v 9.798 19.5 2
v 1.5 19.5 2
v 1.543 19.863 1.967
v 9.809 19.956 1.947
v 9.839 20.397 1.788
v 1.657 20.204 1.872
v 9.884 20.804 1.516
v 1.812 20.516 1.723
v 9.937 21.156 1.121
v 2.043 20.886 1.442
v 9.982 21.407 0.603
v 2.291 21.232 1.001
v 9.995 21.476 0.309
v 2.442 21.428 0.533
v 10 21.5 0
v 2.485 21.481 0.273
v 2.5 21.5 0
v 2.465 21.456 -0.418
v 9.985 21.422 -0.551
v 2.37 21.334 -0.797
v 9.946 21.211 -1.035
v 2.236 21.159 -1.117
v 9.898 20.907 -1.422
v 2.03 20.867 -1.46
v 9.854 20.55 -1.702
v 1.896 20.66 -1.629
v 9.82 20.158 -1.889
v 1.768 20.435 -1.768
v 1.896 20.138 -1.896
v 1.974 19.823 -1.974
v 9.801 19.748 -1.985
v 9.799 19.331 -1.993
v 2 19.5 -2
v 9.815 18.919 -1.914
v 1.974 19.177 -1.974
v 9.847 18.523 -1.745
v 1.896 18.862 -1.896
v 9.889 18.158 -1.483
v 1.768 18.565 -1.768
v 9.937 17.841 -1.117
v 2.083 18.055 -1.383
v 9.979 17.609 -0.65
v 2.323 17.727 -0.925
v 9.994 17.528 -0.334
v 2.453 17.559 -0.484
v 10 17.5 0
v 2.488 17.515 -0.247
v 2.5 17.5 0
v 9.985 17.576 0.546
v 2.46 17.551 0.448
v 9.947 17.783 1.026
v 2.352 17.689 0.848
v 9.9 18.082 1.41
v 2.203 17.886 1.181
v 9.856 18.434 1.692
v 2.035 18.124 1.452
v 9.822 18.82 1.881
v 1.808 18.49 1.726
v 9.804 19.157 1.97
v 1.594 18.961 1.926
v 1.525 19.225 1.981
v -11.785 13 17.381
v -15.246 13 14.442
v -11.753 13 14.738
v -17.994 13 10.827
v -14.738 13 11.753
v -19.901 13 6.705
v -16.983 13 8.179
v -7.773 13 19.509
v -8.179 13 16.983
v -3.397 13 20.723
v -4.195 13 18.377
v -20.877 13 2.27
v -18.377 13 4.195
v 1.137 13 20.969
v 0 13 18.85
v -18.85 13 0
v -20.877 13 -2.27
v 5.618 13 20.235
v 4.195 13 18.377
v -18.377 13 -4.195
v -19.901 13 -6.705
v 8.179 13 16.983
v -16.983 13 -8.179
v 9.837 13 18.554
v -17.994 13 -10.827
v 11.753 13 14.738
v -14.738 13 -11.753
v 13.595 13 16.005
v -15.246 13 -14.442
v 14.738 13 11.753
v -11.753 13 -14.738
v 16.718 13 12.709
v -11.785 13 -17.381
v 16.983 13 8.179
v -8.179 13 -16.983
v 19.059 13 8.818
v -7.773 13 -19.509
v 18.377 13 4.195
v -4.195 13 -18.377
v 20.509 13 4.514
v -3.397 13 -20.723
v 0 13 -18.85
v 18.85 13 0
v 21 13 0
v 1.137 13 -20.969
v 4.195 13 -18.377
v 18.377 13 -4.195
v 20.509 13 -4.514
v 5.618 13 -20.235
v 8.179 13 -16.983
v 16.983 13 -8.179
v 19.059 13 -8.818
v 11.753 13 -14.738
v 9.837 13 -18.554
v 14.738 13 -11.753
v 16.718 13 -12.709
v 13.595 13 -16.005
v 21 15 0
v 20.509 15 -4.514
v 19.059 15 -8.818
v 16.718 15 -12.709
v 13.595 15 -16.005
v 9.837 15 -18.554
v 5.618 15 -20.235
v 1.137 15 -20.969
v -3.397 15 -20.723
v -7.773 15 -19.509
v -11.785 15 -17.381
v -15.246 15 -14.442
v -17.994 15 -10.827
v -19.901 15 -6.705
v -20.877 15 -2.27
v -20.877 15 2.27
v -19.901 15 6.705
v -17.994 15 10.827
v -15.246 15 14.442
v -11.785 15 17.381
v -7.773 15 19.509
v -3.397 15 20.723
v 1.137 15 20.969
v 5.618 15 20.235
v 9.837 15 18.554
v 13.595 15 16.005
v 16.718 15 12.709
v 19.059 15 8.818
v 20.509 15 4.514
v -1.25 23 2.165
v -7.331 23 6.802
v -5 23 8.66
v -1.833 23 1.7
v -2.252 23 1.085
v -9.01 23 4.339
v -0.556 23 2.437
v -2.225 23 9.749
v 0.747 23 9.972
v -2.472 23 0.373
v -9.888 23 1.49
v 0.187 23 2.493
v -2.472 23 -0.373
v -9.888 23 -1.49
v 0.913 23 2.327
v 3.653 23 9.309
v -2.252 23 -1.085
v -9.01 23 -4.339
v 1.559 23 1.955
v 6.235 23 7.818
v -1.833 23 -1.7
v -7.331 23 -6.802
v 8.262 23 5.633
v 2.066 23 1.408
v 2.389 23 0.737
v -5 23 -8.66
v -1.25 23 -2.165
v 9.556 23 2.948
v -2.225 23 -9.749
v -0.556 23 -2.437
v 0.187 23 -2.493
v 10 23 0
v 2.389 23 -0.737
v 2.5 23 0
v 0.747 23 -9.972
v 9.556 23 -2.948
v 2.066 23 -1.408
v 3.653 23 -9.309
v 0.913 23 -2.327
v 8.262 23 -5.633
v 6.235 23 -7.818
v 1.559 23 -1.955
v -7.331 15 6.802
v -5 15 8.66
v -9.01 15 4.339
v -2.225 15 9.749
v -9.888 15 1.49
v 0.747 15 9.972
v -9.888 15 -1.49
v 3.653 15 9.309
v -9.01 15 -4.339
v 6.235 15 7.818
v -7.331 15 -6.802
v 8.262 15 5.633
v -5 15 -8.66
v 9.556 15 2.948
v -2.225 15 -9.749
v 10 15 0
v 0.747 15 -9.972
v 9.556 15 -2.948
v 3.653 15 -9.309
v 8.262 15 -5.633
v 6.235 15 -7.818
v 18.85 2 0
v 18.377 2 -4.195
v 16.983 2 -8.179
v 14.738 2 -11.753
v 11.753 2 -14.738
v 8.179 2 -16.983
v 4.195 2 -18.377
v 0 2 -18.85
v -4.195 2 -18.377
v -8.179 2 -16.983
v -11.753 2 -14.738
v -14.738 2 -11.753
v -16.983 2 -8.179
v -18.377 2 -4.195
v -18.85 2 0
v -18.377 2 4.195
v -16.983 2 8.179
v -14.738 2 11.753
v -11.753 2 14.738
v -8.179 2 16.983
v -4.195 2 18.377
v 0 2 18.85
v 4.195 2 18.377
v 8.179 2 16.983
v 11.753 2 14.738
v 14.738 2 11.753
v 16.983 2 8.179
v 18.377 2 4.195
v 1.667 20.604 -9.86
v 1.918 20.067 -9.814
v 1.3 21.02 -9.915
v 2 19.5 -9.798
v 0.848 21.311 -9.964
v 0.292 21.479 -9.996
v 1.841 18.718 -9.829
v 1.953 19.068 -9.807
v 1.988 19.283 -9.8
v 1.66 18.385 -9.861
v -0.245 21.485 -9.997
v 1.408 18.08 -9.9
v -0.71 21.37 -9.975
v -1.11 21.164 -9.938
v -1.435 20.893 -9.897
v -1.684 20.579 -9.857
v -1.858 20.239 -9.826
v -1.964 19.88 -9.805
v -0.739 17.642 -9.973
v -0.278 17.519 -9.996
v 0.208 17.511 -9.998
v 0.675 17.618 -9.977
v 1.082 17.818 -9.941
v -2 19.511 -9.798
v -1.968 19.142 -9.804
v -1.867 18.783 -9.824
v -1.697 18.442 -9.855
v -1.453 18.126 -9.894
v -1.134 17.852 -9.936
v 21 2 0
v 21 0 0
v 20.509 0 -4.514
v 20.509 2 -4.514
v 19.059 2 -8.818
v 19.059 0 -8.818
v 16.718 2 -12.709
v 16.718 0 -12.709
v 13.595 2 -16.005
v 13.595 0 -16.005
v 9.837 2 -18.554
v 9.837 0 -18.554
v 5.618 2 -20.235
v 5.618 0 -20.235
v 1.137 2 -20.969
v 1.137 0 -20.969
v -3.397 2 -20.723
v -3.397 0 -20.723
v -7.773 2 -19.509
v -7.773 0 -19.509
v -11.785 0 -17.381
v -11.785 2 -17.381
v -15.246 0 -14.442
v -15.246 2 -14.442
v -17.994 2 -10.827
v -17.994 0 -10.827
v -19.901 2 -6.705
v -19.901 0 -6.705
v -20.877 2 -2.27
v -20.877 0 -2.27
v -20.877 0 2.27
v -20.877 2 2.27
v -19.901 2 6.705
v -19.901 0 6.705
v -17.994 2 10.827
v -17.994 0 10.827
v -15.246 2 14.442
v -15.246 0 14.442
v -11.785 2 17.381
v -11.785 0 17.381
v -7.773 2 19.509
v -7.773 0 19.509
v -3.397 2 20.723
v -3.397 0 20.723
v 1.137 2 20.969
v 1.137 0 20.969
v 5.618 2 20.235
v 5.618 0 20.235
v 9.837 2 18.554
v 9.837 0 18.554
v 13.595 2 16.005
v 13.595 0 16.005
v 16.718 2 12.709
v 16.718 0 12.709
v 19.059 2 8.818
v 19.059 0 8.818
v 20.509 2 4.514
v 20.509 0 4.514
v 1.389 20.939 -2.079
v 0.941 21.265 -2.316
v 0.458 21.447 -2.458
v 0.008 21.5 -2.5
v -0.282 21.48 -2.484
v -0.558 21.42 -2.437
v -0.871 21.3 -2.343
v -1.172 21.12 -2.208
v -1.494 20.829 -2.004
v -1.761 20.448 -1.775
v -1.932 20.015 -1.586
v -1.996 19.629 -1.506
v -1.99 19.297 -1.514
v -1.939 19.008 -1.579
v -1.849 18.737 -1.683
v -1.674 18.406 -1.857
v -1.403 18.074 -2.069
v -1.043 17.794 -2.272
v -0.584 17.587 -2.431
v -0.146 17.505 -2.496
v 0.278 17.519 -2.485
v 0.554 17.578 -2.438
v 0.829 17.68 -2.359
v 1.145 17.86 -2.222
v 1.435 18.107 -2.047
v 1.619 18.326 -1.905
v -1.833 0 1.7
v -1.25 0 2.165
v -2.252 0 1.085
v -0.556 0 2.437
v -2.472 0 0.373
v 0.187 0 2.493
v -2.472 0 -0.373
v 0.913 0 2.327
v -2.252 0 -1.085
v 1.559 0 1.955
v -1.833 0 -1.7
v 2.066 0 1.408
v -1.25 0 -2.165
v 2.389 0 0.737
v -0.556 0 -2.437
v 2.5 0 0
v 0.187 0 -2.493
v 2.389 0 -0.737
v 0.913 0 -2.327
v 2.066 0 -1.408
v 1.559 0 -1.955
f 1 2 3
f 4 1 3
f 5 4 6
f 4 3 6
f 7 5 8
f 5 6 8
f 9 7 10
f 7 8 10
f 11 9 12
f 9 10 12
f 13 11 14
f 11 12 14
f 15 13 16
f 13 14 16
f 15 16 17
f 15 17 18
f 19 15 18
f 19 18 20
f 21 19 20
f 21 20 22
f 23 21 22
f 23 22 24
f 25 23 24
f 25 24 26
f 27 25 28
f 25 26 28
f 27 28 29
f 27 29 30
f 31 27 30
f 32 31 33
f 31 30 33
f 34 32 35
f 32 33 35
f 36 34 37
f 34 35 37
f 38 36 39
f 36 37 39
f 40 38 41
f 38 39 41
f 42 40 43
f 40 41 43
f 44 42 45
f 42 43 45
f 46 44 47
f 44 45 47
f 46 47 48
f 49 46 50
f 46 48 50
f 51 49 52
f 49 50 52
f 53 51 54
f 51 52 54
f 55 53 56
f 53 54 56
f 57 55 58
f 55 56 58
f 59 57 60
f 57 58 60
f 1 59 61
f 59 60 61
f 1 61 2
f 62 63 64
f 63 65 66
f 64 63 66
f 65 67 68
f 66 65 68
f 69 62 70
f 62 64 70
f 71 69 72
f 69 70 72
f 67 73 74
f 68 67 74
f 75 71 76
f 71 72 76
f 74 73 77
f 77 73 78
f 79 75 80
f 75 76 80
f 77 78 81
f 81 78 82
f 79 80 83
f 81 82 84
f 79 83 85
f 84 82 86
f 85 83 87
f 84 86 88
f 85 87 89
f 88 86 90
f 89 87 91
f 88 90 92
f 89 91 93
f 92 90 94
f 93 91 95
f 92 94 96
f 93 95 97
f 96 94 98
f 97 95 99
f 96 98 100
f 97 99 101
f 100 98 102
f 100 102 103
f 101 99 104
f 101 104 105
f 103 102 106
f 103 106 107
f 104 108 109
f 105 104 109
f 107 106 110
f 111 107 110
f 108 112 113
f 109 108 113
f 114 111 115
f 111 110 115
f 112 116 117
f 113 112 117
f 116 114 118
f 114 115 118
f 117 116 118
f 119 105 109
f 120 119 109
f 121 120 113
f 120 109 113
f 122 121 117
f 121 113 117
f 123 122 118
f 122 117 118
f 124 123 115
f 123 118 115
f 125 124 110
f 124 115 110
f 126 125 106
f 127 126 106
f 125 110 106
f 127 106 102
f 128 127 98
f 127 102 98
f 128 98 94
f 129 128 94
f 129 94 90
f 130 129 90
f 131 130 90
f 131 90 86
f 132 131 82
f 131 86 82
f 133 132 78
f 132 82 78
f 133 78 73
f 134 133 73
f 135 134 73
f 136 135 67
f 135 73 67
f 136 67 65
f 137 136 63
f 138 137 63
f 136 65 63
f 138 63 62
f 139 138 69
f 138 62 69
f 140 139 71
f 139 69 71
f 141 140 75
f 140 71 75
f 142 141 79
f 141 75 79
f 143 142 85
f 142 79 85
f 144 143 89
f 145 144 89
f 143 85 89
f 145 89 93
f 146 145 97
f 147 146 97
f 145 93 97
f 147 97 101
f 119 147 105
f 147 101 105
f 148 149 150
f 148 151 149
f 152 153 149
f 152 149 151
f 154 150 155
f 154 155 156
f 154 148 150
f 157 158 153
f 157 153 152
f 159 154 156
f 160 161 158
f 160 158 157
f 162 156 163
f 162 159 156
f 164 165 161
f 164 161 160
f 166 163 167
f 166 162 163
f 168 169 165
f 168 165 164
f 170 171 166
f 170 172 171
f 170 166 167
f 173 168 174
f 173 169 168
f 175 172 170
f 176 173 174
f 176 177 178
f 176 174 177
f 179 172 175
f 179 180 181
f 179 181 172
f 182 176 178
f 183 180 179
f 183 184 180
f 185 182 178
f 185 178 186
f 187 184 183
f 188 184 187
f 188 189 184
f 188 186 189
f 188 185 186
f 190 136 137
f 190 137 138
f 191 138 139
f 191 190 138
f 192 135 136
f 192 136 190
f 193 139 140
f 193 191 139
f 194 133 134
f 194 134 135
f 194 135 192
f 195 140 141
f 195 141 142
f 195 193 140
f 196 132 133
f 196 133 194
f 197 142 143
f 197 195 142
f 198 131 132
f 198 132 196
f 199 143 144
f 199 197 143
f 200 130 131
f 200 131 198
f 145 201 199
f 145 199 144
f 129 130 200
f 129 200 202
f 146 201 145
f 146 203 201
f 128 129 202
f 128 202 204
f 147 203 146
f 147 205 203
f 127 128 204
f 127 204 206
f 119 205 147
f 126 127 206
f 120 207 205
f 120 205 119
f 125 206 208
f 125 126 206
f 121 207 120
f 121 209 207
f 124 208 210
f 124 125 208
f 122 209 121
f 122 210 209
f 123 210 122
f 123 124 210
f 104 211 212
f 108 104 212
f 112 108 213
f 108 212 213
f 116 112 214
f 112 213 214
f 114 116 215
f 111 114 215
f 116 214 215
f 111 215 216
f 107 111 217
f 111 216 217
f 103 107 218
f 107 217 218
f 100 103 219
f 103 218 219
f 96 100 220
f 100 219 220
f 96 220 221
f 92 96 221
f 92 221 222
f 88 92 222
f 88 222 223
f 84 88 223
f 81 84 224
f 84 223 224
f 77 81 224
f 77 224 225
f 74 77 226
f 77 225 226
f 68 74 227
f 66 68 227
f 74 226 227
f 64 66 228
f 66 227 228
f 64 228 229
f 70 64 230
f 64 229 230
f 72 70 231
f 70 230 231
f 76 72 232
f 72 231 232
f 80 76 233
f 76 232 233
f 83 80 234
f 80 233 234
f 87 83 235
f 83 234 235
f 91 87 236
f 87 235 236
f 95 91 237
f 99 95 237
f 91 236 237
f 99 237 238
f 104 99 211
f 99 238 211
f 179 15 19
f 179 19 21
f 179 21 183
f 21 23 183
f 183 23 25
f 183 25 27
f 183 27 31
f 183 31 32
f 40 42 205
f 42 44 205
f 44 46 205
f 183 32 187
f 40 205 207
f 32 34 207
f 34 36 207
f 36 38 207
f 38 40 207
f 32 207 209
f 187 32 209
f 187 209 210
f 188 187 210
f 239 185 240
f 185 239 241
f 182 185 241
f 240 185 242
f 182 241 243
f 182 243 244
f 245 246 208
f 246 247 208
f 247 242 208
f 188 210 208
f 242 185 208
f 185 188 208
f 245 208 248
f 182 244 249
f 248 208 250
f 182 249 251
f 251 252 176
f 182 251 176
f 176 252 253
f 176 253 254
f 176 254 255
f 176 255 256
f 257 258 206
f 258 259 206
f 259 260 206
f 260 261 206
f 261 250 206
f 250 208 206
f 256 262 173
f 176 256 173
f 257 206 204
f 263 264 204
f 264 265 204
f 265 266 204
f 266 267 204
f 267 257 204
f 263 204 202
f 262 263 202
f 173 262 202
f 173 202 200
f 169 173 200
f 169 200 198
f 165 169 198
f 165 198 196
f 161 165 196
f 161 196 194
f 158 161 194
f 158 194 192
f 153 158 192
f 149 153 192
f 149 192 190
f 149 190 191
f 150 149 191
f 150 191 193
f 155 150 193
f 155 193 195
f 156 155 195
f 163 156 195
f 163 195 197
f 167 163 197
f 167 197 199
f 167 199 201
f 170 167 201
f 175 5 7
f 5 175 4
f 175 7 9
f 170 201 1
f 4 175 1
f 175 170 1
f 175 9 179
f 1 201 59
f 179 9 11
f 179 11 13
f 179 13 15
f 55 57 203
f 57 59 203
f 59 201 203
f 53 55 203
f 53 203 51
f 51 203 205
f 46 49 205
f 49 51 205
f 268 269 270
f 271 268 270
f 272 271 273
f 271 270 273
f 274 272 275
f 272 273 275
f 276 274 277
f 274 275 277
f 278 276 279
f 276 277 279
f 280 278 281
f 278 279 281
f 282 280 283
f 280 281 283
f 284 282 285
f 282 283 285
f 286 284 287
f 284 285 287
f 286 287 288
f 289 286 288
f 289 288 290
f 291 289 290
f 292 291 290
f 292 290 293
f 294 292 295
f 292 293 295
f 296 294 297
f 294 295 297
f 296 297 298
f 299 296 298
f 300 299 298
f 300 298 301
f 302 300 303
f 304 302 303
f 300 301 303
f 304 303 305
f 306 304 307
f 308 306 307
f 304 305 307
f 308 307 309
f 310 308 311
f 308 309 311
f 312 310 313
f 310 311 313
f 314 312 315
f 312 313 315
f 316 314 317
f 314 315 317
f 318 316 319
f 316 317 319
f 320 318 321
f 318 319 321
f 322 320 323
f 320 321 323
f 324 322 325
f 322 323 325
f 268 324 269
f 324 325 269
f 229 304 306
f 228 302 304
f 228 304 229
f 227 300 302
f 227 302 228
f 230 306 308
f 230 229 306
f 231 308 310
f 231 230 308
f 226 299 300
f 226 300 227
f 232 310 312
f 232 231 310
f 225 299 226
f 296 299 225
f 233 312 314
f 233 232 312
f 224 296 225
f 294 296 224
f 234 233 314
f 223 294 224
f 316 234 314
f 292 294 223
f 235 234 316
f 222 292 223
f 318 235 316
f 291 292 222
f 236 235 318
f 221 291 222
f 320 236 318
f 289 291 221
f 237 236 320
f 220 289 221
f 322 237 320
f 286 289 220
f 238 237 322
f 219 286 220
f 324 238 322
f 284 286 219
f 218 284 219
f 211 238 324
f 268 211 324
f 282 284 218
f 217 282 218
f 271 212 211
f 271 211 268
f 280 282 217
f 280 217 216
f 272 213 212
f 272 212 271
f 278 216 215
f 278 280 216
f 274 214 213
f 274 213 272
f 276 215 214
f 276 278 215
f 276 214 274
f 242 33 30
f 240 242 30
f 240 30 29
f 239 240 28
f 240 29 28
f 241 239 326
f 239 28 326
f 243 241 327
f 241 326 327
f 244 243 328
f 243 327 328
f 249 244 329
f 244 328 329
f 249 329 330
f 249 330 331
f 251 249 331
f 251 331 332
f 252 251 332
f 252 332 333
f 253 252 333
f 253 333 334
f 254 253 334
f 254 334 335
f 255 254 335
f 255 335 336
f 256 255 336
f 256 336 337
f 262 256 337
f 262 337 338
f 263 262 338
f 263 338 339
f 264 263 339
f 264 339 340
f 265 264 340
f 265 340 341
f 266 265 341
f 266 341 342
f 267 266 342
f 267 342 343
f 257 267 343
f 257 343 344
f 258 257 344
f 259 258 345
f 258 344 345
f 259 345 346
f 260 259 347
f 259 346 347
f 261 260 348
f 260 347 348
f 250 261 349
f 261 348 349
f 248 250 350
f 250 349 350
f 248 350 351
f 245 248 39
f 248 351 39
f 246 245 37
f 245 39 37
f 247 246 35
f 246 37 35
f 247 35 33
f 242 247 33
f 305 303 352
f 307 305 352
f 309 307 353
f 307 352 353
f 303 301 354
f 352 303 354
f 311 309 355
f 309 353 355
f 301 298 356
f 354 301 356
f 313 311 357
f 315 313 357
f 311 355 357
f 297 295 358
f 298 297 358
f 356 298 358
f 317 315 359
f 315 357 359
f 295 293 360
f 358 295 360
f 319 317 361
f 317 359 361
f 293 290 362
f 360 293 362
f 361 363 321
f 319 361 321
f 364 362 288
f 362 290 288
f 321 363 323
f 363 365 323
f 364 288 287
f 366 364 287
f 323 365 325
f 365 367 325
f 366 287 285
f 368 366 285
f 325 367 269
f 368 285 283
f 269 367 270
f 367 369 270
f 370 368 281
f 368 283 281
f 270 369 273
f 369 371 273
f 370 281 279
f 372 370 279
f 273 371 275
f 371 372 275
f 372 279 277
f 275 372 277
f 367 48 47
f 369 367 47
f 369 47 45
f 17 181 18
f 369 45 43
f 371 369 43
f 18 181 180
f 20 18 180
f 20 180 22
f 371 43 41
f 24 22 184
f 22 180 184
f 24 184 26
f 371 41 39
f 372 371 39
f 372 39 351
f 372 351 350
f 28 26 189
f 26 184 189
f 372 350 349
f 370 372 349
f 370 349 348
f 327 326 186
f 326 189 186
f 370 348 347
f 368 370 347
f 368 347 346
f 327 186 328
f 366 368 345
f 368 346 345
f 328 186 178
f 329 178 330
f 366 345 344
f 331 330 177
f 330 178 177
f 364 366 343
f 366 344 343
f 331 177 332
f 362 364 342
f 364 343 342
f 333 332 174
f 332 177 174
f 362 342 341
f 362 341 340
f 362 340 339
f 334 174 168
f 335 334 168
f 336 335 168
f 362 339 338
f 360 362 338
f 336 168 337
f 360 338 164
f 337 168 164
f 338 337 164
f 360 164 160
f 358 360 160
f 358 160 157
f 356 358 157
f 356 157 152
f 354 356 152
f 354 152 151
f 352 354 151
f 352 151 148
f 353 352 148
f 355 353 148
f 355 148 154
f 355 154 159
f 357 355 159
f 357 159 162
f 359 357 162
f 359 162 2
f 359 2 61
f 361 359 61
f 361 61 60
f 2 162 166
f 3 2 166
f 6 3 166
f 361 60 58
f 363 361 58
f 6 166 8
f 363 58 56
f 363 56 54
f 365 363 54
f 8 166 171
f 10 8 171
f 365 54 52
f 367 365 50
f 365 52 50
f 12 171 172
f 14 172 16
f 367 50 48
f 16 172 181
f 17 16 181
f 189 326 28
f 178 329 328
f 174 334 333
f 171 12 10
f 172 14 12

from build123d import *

# Parameters (mm, degrees)
SKETCH1_R           = 21
BOSS_EXTRUDE1_DEPTH = 2
SKETCH2_R           = 18.85
BOSS_EXTRUDE2_DEPTH = 11
SKETCH3_R           = 21
BOSS_EXTRUDE3_DEPTH = 2
SKETCH4_R           = 10
BOSS_EXTRUDE4_DEPTH = 8
SKETCH5_R           = 2.5
CUT_EXTRUDE1_DEPTH  = 24
SKETCH6_R           = 2
CUT_EXTRUDE2_DEPTH  = 22
CIRPATTERN1_COUNT   = 2
CIRPATTERN1_ANGLE   = 90


with BuildPart() as part:
    # Sketch1 → Boss-Extrude1 (new body)
    with BuildSketch(Plane(origin=(0, 0, 0), x_dir=(1, 0, 0), z_dir=(0, 1, 0))):
        Circle(SKETCH1_R)
    extrude(amount=BOSS_EXTRUDE1_DEPTH)

    # Sketch2 → Boss-Extrude2 (add)
    with BuildSketch(Plane(origin=(0, 2, 0), x_dir=(1, 0, 0), z_dir=(0, 1, 0))):
        Circle(SKETCH2_R)
    extrude(amount=BOSS_EXTRUDE2_DEPTH)

    # Sketch3 → Boss-Extrude3 (add)
    with BuildSketch(Plane(origin=(0, 13, 0), x_dir=(1, 0, 0), z_dir=(0, 1, 0))):
        Circle(SKETCH3_R)
    extrude(amount=BOSS_EXTRUDE3_DEPTH)

    # Sketch4 → Boss-Extrude4 (add)
    with BuildSketch(Plane(origin=(0, 15, 0), x_dir=(1, 0, 0), z_dir=(0, 1, 0))):
        Circle(SKETCH4_R)
    extrude(amount=BOSS_EXTRUDE4_DEPTH)

    # Sketch5 → Cut-Extrude1 (cut, through all)
    with BuildSketch(Plane(origin=(0, 23, 0), x_dir=(1, 0, 0), z_dir=(0, 1, 0))):
        Circle(SKETCH5_R)
    extrude(amount=-CUT_EXTRUDE1_DEPTH, mode=Mode.SUBTRACT)

    # Sketch6 → Cut-Extrude2 (cut, through all)
    with BuildSketch(Plane.XY):
        with Locations((0, 19.5)):
            Circle(SKETCH6_R)
    cut_extrude2 = extrude(amount=-CUT_EXTRUDE2_DEPTH, mode=Mode.SUBTRACT)

    # CirPattern1: Cut-Extrude2 ×2 about axis
    cirpattern1_axis = Axis((0, 23, 0), (0, -1, 0))
    for i in range(1, CIRPATTERN1_COUNT):
        add(cut_extrude2.rotate(cirpattern1_axis, i * CIRPATTERN1_ANGLE / (CIRPATTERN1_COUNT - 1)), mode=Mode.SUBTRACT)


solid = part.part
